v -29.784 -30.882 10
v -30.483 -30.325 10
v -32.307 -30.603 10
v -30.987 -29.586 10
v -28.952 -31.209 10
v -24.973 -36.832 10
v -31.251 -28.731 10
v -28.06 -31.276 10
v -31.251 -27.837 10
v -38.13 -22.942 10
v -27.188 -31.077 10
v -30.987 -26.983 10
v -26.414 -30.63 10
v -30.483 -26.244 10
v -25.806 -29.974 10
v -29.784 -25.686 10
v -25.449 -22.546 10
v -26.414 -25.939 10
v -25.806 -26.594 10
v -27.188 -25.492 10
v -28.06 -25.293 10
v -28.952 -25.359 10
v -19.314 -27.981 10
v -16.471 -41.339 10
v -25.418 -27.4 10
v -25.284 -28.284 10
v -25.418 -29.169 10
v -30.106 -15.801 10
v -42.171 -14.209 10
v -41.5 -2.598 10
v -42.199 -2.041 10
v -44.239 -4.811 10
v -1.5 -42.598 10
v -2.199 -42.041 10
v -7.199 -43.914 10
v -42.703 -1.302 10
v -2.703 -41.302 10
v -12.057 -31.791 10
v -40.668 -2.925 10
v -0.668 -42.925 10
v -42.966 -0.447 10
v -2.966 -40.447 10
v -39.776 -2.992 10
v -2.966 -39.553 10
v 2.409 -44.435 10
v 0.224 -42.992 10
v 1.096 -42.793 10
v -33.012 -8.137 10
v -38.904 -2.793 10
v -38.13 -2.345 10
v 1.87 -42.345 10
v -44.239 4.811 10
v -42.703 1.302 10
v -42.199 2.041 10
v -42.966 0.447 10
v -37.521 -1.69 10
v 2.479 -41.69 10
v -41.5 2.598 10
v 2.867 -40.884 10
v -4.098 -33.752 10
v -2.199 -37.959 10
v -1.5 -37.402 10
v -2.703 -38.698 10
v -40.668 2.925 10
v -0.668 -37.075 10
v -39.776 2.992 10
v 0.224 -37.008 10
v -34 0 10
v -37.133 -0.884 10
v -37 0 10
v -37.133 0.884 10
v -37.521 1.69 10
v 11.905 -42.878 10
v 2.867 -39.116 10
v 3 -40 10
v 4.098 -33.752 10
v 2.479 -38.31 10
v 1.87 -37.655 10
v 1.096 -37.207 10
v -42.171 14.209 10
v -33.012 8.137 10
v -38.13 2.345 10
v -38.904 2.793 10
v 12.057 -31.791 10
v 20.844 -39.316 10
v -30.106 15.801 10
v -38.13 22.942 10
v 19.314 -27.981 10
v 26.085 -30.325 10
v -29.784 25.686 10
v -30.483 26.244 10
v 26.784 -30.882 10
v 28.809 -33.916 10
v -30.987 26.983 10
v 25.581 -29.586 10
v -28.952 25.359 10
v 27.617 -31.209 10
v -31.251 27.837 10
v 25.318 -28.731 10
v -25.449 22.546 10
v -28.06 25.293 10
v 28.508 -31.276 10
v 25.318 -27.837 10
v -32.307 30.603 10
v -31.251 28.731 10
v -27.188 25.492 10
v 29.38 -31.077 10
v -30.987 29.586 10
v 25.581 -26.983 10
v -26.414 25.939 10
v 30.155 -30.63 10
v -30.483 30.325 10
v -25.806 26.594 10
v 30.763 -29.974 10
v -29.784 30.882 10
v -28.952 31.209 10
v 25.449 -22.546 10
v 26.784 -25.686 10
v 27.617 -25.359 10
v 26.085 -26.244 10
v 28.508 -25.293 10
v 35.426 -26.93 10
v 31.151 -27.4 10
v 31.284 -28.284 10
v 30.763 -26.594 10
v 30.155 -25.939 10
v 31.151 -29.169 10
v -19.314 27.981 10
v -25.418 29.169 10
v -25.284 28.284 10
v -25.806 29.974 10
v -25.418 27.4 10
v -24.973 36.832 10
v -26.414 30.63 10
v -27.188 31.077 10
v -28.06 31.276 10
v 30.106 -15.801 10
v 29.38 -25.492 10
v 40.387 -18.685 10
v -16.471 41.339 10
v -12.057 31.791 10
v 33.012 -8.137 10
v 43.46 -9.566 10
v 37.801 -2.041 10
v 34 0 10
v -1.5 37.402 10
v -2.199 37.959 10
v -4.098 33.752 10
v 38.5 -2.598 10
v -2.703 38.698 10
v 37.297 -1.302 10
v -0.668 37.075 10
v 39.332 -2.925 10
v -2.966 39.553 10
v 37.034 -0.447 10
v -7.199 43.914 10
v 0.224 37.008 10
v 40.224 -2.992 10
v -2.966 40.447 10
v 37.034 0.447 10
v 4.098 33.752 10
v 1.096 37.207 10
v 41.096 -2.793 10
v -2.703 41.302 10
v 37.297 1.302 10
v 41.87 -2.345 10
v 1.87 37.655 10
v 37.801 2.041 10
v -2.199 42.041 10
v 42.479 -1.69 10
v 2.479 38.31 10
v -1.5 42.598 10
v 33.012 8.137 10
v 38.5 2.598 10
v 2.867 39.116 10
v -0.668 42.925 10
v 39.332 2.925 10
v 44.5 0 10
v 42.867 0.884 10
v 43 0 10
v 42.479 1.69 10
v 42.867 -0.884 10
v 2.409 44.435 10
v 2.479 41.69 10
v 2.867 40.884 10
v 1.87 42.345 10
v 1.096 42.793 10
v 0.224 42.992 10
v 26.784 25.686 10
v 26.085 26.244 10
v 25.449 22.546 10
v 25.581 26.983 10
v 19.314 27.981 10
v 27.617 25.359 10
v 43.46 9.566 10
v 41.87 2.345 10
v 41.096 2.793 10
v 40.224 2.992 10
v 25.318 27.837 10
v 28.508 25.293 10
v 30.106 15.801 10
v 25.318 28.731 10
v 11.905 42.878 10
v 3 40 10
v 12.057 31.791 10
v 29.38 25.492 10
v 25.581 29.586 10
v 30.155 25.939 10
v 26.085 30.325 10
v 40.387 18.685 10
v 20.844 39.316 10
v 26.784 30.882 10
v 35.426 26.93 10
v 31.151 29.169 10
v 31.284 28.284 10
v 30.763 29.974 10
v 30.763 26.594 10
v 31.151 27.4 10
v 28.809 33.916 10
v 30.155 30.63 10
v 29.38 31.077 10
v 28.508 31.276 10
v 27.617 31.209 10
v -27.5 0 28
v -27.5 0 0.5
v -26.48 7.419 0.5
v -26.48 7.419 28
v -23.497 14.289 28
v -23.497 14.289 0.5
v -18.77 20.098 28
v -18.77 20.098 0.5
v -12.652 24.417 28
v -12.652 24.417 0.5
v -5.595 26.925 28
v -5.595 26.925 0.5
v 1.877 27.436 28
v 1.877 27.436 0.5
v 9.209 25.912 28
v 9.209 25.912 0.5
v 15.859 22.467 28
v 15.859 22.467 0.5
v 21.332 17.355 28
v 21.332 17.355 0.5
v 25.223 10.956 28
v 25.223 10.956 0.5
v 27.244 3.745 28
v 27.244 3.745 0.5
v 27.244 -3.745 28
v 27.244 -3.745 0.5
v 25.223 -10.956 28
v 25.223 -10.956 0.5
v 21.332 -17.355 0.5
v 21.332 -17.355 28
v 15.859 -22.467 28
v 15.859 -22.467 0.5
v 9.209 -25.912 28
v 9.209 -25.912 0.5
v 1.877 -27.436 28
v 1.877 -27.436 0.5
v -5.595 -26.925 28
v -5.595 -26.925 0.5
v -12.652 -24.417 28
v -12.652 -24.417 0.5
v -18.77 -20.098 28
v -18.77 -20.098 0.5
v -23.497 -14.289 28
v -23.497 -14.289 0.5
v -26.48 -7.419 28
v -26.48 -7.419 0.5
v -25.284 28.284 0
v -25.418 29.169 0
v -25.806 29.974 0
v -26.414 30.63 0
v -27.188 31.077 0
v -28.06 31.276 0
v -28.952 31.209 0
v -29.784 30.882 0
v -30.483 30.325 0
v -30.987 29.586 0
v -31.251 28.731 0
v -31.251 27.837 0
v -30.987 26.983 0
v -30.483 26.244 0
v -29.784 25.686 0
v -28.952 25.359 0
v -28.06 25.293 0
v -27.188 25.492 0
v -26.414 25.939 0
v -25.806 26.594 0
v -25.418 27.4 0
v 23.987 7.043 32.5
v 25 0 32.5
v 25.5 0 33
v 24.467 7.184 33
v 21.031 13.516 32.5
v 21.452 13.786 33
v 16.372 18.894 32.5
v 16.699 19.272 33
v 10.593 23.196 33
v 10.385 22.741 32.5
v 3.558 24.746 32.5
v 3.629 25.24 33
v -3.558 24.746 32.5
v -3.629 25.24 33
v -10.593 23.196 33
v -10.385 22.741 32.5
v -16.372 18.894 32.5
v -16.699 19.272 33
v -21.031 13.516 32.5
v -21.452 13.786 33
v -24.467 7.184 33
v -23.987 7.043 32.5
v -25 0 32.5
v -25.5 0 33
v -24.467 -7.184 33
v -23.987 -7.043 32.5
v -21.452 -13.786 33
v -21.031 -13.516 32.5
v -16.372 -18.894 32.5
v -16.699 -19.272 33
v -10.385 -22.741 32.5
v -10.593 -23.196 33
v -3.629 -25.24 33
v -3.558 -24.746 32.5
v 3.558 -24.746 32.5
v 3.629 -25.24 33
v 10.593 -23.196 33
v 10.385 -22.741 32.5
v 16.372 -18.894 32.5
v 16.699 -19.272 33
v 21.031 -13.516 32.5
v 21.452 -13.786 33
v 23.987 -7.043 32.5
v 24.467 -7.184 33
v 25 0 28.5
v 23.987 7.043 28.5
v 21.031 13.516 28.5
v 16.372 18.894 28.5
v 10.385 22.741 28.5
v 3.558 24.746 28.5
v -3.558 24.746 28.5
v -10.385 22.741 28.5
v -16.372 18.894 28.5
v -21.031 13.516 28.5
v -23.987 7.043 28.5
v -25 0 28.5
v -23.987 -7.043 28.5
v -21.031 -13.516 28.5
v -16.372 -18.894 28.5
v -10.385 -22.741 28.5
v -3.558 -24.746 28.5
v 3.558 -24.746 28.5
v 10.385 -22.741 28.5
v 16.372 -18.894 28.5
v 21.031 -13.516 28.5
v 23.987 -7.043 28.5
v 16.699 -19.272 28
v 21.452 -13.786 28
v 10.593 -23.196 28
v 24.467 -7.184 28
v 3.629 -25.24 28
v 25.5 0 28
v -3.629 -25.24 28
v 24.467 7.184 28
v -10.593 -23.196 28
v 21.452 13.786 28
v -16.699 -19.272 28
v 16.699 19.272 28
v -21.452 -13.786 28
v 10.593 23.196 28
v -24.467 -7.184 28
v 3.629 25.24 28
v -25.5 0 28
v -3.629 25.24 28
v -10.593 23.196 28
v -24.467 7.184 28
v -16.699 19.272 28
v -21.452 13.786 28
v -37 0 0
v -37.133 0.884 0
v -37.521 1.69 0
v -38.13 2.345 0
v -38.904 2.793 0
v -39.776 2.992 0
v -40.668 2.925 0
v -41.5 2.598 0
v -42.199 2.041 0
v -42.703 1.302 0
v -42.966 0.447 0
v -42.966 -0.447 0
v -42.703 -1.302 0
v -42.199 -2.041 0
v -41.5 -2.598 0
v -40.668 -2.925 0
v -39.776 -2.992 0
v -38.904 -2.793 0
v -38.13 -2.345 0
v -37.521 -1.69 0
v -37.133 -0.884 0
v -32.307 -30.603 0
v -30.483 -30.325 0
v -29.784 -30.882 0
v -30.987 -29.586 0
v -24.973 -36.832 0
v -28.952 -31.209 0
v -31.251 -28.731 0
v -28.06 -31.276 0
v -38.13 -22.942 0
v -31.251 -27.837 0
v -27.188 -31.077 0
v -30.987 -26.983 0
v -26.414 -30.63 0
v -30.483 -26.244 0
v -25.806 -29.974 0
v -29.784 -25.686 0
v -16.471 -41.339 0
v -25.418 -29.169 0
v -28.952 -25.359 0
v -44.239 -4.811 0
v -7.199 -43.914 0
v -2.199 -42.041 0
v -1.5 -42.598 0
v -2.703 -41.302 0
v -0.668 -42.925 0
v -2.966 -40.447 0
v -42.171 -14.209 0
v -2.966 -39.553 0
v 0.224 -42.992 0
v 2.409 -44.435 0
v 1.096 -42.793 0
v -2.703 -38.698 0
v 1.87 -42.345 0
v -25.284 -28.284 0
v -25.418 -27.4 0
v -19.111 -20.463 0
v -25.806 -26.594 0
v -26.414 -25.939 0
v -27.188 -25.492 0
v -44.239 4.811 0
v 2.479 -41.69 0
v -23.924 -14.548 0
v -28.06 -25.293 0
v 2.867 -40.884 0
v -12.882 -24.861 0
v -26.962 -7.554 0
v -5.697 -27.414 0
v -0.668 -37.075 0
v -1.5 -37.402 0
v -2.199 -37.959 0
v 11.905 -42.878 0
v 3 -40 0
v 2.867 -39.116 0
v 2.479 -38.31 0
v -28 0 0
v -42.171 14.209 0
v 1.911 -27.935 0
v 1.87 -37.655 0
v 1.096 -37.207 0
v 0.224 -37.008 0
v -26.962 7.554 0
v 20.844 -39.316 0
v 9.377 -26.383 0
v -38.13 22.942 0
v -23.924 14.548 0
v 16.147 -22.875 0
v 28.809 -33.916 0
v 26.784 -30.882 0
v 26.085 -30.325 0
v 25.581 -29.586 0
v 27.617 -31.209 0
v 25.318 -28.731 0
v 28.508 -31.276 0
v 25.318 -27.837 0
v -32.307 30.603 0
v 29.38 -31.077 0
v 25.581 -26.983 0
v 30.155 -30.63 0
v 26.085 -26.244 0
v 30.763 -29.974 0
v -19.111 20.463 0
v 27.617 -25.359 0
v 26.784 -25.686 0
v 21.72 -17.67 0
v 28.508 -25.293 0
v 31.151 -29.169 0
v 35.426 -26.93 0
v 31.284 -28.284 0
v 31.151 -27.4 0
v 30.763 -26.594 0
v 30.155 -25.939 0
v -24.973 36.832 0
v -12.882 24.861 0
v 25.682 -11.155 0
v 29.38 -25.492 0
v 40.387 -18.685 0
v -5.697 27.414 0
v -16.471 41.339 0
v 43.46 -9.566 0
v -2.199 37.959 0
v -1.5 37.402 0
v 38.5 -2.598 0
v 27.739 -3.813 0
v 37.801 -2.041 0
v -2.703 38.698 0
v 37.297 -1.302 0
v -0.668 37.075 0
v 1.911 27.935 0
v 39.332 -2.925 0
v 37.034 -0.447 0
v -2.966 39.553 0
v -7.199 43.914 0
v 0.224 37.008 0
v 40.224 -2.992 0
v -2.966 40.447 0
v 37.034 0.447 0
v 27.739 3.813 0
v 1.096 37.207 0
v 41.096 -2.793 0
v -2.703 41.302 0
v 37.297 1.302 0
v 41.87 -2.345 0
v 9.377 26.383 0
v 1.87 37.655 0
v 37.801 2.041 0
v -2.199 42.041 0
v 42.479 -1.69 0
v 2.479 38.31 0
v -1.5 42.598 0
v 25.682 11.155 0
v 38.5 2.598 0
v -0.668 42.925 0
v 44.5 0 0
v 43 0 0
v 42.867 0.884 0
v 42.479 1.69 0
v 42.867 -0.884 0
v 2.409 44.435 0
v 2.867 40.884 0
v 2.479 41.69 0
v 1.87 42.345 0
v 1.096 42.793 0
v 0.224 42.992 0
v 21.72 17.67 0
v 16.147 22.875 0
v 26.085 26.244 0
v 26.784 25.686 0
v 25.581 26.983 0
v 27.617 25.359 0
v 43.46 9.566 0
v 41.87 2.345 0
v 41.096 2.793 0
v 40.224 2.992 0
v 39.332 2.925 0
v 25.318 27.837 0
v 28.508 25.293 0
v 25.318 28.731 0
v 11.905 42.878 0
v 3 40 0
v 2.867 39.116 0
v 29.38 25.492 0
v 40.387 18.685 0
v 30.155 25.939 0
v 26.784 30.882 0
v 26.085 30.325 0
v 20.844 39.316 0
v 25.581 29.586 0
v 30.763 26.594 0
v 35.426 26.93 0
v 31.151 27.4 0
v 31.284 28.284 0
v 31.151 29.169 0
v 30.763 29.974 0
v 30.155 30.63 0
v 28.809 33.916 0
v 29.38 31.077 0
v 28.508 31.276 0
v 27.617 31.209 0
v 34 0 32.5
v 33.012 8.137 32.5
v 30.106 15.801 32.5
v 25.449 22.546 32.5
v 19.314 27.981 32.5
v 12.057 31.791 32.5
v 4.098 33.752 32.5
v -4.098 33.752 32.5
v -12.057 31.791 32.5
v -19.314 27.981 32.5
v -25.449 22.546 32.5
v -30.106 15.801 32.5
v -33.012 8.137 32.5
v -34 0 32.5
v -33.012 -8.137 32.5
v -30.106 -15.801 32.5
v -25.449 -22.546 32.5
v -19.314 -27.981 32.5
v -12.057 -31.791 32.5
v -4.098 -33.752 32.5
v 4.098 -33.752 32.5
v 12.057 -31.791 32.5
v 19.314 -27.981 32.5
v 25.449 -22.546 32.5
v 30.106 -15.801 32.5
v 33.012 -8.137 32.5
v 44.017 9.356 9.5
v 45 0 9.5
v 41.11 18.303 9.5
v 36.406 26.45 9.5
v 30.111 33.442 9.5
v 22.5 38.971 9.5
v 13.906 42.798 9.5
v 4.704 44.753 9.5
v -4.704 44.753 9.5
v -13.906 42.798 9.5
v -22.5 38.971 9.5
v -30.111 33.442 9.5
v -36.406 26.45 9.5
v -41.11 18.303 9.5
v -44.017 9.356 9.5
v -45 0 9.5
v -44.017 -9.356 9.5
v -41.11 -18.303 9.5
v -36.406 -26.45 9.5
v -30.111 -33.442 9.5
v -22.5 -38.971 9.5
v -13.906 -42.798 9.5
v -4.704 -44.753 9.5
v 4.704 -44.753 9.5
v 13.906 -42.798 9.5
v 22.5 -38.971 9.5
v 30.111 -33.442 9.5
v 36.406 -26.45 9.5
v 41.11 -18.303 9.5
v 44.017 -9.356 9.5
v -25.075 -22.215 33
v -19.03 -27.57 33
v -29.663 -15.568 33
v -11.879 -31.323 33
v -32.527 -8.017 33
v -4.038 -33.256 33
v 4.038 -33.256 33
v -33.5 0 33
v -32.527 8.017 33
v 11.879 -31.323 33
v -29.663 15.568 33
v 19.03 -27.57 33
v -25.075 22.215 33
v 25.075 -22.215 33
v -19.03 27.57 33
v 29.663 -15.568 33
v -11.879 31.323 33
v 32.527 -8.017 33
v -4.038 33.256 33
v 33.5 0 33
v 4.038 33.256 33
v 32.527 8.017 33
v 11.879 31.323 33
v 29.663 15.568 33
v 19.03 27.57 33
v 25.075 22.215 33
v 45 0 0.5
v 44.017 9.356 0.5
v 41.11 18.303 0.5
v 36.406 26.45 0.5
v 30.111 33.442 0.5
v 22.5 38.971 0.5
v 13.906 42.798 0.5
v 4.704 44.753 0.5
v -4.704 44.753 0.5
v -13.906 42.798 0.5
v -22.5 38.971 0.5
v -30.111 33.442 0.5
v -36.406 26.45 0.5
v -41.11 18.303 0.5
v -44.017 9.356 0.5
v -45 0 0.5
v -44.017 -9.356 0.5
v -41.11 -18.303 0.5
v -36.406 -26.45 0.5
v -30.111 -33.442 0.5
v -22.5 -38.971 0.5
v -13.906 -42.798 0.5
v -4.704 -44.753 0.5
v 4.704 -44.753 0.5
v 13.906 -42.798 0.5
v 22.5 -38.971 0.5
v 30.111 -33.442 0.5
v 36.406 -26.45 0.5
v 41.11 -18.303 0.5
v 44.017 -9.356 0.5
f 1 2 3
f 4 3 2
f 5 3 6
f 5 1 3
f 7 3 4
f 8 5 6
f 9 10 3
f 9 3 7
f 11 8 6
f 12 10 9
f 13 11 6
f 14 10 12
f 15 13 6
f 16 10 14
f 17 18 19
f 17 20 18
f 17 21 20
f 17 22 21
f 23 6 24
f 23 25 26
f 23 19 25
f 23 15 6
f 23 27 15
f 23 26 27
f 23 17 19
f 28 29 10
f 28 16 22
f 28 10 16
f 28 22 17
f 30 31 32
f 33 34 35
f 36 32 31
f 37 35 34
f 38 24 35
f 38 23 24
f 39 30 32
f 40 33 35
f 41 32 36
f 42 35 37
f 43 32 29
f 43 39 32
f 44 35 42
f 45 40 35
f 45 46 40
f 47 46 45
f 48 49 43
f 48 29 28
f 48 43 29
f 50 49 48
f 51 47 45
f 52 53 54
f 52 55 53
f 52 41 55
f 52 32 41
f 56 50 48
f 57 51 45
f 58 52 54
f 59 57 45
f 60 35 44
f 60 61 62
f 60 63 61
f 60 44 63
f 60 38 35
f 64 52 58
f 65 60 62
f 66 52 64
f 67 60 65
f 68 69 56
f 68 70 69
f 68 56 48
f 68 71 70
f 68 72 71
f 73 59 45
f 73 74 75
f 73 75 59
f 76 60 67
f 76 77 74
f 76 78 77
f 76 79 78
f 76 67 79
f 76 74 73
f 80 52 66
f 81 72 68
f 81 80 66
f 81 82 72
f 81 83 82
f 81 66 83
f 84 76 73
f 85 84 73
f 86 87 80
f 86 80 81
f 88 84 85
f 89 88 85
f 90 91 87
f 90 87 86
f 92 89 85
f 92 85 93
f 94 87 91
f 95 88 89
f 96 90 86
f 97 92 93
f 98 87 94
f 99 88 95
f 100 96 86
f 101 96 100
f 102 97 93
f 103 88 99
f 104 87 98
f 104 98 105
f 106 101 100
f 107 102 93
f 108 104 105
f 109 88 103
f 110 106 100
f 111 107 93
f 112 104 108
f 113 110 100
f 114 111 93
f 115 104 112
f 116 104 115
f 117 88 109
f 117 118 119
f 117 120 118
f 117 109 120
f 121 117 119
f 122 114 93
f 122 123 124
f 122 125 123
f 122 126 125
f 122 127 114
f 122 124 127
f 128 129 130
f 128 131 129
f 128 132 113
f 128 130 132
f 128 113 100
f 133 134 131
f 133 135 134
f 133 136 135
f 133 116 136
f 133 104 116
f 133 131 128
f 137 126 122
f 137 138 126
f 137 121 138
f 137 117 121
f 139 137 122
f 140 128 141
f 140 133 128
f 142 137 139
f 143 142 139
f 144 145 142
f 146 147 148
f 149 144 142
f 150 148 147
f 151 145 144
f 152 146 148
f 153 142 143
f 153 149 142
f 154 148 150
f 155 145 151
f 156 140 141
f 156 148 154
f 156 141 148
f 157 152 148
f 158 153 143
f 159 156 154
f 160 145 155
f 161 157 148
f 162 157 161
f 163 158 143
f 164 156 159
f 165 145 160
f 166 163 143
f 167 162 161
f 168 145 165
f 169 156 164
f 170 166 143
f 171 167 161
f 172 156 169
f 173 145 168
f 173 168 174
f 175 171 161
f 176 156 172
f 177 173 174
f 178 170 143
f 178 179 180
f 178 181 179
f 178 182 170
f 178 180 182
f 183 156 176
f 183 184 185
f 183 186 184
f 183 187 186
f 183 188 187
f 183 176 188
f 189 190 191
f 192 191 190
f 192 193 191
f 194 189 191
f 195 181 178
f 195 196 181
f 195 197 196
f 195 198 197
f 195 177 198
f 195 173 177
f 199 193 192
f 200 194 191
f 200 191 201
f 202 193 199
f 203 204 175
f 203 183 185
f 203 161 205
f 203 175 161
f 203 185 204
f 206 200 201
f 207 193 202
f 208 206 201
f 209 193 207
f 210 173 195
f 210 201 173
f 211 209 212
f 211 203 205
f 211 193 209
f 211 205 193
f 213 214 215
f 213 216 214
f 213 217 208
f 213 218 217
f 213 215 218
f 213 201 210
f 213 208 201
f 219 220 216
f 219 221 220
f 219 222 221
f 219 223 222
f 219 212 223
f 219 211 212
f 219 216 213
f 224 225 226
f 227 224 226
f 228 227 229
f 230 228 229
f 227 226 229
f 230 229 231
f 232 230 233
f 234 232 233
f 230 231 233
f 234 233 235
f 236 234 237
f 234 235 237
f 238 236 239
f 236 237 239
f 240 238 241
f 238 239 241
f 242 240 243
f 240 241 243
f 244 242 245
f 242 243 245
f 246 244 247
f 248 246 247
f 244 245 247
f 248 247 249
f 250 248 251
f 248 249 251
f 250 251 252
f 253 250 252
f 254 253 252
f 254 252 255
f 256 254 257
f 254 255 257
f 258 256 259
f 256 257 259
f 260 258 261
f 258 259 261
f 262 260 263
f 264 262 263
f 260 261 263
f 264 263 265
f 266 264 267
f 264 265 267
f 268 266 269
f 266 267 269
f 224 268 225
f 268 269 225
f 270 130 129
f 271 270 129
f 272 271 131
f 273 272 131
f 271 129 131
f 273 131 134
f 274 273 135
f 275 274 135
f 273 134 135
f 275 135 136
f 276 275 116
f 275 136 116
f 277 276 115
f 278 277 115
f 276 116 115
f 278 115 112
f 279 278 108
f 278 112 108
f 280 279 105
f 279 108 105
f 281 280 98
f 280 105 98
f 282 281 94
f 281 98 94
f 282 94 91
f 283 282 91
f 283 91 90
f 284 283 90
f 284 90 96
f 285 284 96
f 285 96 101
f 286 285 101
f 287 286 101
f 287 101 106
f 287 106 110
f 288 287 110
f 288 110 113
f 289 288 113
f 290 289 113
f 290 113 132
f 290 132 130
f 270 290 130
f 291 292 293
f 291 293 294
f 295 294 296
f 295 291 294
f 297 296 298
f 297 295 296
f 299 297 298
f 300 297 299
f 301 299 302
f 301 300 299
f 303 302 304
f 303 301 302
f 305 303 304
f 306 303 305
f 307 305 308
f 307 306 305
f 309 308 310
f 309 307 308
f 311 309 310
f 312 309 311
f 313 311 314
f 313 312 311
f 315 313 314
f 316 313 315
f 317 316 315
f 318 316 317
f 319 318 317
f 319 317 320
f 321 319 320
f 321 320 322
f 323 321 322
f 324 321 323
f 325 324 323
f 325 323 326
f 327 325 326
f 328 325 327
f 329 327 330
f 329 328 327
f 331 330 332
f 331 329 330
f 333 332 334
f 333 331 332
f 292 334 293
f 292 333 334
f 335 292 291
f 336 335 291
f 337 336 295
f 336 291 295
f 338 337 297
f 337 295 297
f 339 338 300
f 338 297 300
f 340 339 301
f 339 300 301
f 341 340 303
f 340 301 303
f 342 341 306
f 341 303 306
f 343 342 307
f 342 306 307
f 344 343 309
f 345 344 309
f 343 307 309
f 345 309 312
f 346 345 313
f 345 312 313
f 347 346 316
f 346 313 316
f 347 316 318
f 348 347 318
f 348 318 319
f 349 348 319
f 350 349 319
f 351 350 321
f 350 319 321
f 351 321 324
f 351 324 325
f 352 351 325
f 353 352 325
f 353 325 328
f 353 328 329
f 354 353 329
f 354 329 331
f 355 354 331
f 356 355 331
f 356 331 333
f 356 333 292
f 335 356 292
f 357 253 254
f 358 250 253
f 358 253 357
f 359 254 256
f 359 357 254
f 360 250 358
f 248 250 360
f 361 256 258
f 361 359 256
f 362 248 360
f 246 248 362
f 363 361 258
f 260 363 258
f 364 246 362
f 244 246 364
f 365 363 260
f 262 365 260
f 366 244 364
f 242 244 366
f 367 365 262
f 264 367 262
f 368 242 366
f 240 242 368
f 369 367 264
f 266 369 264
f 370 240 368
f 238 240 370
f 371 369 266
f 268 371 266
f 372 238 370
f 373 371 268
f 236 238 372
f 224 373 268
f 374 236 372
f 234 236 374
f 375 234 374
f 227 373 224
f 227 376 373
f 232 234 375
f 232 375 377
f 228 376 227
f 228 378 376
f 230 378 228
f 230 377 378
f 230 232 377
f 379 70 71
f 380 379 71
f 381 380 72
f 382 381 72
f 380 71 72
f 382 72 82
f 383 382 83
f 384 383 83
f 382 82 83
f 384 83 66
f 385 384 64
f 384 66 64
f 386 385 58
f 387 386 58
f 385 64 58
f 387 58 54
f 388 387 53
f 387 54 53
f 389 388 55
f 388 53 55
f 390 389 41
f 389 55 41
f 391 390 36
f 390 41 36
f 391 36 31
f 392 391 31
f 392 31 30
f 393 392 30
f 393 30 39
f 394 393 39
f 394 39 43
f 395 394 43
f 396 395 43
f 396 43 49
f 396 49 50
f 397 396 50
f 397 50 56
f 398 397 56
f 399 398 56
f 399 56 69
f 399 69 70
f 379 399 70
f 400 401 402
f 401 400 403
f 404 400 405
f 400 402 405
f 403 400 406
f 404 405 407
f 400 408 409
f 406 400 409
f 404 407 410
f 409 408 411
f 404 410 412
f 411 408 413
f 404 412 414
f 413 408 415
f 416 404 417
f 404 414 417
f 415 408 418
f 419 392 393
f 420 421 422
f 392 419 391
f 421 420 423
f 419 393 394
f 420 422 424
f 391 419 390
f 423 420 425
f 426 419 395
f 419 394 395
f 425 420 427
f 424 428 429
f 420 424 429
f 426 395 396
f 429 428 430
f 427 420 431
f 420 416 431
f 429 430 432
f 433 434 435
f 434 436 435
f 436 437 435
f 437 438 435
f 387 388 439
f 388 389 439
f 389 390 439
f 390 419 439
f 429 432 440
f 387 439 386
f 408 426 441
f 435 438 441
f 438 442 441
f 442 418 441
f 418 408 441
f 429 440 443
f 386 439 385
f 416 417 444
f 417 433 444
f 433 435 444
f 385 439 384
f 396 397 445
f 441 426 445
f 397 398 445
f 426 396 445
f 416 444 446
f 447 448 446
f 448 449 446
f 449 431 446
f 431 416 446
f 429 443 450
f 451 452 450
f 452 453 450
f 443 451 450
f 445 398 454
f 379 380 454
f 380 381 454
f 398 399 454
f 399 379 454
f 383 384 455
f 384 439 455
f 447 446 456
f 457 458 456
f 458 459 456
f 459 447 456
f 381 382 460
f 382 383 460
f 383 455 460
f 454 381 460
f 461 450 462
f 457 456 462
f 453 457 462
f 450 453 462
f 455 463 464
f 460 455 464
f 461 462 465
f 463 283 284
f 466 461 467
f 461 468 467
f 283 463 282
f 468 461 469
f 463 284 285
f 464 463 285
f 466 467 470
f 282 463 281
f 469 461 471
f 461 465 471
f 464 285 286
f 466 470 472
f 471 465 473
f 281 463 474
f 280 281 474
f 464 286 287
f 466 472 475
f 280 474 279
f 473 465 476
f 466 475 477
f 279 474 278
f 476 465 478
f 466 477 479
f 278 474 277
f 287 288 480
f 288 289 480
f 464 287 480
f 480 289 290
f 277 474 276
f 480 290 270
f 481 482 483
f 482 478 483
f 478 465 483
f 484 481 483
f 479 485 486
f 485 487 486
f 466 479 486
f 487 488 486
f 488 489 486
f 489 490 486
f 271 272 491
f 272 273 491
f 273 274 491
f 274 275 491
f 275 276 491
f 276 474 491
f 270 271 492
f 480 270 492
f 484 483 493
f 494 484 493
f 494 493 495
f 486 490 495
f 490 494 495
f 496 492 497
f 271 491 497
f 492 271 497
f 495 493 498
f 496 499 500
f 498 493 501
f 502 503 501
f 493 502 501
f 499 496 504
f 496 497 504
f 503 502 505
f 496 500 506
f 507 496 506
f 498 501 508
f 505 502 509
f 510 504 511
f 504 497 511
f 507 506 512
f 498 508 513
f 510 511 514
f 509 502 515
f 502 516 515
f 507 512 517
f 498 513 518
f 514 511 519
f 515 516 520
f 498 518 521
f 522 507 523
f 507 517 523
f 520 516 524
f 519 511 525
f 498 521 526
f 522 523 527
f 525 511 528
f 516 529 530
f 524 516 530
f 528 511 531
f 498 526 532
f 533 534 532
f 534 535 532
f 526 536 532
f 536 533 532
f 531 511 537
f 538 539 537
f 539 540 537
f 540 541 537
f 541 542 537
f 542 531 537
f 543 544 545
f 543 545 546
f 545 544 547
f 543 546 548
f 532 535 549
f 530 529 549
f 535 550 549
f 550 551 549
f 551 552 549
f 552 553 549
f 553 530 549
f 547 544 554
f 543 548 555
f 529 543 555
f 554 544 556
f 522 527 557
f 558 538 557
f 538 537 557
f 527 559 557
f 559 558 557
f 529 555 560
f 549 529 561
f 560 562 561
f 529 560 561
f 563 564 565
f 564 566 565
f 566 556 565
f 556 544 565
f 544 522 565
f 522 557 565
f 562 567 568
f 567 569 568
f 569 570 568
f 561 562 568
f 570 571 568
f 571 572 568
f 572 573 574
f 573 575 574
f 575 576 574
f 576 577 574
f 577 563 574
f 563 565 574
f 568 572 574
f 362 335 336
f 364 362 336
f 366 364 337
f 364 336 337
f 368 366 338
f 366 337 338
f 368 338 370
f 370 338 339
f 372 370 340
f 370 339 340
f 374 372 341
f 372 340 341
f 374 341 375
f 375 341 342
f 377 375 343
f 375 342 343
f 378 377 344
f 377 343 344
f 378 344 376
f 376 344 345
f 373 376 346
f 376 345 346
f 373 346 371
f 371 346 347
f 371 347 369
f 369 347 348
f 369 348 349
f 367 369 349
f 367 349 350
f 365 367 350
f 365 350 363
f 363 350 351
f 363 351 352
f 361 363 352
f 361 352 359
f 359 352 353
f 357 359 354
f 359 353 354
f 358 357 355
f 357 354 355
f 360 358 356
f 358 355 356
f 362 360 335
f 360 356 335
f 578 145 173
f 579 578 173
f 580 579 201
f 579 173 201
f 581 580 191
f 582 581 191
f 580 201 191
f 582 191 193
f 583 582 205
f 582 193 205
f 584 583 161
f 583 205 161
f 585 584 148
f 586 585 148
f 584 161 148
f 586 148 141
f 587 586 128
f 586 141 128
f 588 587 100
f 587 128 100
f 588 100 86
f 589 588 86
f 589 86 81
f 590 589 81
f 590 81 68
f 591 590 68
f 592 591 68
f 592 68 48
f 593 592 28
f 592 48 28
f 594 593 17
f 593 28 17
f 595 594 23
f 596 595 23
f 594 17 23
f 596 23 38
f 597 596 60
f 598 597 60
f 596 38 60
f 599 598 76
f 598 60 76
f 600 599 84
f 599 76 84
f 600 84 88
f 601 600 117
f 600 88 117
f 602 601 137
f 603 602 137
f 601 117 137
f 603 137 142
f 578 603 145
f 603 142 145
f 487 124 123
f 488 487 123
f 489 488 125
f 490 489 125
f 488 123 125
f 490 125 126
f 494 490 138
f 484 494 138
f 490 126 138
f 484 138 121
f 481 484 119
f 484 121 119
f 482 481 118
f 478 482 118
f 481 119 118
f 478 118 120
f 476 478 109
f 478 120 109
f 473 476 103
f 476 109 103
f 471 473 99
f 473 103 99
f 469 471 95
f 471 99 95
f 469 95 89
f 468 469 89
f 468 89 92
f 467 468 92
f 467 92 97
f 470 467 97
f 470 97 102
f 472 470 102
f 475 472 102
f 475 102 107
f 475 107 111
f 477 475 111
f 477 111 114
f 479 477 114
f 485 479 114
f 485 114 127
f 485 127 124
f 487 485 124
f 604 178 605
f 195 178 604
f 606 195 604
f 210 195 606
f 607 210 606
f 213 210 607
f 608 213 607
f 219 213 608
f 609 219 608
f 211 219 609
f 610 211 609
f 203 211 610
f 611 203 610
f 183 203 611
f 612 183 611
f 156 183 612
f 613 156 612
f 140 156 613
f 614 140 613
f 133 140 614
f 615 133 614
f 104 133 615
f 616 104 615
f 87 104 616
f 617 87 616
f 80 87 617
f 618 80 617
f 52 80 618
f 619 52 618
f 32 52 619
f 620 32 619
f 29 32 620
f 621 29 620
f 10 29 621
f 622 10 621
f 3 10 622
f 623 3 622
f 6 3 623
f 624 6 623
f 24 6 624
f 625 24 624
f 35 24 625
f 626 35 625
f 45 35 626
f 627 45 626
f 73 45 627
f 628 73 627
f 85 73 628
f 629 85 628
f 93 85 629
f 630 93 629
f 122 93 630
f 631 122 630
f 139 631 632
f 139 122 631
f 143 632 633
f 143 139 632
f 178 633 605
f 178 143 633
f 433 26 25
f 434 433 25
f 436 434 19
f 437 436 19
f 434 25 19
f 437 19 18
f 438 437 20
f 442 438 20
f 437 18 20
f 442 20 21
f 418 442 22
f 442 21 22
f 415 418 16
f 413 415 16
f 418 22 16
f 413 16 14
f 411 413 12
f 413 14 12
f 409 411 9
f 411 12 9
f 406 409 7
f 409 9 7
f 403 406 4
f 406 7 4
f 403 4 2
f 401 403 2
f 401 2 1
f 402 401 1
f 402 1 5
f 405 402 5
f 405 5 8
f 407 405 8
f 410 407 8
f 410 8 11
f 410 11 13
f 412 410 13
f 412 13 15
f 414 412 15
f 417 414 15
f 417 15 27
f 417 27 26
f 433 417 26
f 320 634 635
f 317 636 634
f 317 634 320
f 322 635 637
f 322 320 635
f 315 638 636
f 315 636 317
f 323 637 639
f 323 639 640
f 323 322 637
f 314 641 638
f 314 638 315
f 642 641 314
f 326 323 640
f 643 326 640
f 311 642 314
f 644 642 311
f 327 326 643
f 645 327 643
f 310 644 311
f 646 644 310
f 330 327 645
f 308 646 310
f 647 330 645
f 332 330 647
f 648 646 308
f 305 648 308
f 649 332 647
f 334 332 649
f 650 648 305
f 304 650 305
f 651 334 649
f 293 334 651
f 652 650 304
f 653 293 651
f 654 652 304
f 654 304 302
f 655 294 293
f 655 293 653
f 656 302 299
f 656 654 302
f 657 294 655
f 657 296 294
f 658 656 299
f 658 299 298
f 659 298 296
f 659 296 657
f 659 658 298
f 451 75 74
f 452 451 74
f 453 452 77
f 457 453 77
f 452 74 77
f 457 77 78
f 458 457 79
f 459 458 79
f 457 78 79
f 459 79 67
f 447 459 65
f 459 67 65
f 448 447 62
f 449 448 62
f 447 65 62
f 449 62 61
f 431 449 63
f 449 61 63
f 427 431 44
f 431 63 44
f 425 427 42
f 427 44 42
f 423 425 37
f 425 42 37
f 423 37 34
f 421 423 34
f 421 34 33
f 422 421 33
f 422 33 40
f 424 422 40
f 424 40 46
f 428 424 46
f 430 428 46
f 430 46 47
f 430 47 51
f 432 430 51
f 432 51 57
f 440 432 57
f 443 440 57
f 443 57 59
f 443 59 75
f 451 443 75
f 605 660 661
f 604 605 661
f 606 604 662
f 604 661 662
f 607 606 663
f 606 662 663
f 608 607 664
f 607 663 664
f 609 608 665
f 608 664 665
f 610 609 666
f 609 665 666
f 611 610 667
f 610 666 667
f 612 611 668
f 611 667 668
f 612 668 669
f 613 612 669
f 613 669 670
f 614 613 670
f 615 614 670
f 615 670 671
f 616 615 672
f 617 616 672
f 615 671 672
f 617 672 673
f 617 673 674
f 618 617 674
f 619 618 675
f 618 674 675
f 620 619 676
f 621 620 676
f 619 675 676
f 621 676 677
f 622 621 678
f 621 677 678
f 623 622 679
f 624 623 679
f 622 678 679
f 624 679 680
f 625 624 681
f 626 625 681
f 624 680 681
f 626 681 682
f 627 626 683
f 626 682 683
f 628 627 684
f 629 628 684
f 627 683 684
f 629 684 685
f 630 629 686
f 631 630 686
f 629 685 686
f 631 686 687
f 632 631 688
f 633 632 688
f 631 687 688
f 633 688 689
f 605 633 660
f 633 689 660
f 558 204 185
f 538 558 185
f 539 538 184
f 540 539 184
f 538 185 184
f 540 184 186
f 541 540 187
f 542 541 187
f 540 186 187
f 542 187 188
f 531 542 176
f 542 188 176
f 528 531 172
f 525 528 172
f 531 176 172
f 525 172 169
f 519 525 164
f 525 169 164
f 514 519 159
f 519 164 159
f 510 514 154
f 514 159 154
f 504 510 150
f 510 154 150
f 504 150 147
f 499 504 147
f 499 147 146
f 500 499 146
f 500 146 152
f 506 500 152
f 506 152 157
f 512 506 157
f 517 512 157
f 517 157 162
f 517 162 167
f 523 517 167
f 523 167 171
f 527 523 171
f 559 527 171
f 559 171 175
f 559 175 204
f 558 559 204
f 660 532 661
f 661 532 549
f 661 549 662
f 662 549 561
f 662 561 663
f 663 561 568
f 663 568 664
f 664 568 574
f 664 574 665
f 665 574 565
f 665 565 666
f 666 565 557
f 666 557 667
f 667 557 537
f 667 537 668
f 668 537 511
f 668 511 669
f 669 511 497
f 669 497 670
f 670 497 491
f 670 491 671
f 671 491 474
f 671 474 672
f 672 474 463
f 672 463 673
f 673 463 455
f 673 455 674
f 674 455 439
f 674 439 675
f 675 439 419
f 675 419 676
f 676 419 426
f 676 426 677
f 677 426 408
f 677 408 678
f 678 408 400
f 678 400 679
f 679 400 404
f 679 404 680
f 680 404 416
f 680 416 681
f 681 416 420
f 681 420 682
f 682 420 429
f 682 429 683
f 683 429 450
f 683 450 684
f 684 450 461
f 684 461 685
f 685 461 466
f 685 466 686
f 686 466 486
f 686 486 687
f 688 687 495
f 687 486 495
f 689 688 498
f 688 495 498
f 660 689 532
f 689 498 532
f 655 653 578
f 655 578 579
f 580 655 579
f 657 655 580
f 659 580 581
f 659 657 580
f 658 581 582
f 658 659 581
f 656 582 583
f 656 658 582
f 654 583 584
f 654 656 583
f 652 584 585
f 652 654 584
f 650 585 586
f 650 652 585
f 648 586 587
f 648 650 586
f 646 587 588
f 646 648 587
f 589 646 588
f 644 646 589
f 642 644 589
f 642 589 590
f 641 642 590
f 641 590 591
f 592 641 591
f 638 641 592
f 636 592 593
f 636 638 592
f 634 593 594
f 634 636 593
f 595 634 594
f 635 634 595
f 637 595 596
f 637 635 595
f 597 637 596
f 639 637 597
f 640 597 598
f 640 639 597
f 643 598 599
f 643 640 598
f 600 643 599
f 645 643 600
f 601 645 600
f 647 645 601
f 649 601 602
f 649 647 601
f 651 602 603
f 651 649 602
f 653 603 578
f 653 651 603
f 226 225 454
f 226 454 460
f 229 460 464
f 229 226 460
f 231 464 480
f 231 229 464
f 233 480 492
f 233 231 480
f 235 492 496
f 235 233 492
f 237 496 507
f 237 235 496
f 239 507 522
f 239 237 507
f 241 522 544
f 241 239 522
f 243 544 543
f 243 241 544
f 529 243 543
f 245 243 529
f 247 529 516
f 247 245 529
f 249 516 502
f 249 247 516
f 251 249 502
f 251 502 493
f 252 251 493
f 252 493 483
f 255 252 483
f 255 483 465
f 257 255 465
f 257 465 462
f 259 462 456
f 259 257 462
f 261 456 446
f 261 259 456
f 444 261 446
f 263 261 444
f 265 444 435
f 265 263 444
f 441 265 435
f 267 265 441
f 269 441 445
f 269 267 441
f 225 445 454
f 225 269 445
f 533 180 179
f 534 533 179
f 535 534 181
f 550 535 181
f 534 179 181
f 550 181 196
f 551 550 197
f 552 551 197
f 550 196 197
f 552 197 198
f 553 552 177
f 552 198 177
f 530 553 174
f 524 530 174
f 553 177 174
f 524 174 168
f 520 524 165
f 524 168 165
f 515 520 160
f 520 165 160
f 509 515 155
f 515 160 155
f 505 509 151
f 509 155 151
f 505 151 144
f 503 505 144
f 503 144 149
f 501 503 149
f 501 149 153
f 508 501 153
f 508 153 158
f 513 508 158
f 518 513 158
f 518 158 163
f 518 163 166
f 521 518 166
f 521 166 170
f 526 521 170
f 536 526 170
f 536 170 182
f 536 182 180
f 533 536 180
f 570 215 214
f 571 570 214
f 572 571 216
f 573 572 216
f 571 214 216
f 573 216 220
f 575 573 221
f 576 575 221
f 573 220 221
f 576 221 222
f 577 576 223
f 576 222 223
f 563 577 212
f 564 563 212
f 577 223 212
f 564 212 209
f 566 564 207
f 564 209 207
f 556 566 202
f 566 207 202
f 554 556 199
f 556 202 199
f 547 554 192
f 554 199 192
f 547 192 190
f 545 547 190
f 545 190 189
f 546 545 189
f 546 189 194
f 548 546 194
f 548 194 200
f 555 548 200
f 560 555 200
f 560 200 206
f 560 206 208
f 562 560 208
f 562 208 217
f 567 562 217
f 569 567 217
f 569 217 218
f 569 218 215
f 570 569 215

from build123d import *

# Parameters (mm, degrees)
SKETCH_1_R          = 45
EXTRUDE_1_DEPTH     = 10
SKETCH_2_R          = 34
EXTRUDE_2_DEPTH     = 23
SKETCH_4_R          = 25
CUT_EXTRUDE_1_DEPTH = 70
SKETCH_5_R          = 27.5
CUT_EXTRUDE_2_DEPTH = 28
SKETCH_6_R          = 3
CUT_EXTRUDE_3_DEPTH = 25
CHAMFER_1_SIZE      = 0.5


with BuildPart() as part:
    # 草图1 → 拉伸1 (new body)
    with BuildSketch(Plane.XY):
        Circle(SKETCH_1_R)
    extrude(amount=EXTRUDE_1_DEPTH)

    # 草图2 → 拉伸2 (add)
    with BuildSketch(Plane.XY.offset(10)):
        Circle(SKETCH_2_R)
    extrude(amount=EXTRUDE_2_DEPTH)

    # 草图4 → 切除-拉伸1 (cut)
    with BuildSketch(Plane.XY.offset(33)):
        Circle(SKETCH_4_R)
    extrude(amount=-CUT_EXTRUDE_1_DEPTH, mode=Mode.SUBTRACT)

    # 草图5 → 切除-拉伸2 (cut)
    with BuildSketch(Plane(origin=(0, 0, 0), x_dir=(-1, 0, 0), z_dir=(0, 0, -1))):
        Circle(SKETCH_5_R)
    extrude(amount=-CUT_EXTRUDE_2_DEPTH, mode=Mode.SUBTRACT)

    # 草图6 → 切除-拉伸3 (cut)
    with BuildSketch(Plane.XY.offset(10)):
        with Locations((28.284271247, 28.284271247)):
            Circle(SKETCH_6_R)
        with Locations((40, 0)):
            Circle(SKETCH_6_R)
        with Locations((28.284271247, -28.284271247)):
            Circle(SKETCH_6_R)
        with Locations((0, -40)):
            Circle(SKETCH_6_R)
        with Locations((-28.284271247, -28.284271247)):
            Circle(SKETCH_6_R)
        with Locations((0, 40)):
            Circle(SKETCH_6_R)
        with Locations((-40, 0)):
            Circle(SKETCH_6_R)
        with Locations((-28.284271247, 28.284271247)):
            Circle(SKETCH_6_R)
    extrude(amount=-CUT_EXTRUDE_3_DEPTH, mode=Mode.SUBTRACT)

    # 倒角1
    chamfer_1_edges = [part.edges().sort_by_distance(p)[0] for p in [
        (-25, 0, 33),
        (27.5, 0, 0),
        (-25, 0, 28),
        (-45, 0, 0),
        (-45, 0, 10),
        (-34, 0, 33),
    ]]
    chamfer(chamfer_1_edges, length=CHAMFER_1_SIZE)


solid = part.part
